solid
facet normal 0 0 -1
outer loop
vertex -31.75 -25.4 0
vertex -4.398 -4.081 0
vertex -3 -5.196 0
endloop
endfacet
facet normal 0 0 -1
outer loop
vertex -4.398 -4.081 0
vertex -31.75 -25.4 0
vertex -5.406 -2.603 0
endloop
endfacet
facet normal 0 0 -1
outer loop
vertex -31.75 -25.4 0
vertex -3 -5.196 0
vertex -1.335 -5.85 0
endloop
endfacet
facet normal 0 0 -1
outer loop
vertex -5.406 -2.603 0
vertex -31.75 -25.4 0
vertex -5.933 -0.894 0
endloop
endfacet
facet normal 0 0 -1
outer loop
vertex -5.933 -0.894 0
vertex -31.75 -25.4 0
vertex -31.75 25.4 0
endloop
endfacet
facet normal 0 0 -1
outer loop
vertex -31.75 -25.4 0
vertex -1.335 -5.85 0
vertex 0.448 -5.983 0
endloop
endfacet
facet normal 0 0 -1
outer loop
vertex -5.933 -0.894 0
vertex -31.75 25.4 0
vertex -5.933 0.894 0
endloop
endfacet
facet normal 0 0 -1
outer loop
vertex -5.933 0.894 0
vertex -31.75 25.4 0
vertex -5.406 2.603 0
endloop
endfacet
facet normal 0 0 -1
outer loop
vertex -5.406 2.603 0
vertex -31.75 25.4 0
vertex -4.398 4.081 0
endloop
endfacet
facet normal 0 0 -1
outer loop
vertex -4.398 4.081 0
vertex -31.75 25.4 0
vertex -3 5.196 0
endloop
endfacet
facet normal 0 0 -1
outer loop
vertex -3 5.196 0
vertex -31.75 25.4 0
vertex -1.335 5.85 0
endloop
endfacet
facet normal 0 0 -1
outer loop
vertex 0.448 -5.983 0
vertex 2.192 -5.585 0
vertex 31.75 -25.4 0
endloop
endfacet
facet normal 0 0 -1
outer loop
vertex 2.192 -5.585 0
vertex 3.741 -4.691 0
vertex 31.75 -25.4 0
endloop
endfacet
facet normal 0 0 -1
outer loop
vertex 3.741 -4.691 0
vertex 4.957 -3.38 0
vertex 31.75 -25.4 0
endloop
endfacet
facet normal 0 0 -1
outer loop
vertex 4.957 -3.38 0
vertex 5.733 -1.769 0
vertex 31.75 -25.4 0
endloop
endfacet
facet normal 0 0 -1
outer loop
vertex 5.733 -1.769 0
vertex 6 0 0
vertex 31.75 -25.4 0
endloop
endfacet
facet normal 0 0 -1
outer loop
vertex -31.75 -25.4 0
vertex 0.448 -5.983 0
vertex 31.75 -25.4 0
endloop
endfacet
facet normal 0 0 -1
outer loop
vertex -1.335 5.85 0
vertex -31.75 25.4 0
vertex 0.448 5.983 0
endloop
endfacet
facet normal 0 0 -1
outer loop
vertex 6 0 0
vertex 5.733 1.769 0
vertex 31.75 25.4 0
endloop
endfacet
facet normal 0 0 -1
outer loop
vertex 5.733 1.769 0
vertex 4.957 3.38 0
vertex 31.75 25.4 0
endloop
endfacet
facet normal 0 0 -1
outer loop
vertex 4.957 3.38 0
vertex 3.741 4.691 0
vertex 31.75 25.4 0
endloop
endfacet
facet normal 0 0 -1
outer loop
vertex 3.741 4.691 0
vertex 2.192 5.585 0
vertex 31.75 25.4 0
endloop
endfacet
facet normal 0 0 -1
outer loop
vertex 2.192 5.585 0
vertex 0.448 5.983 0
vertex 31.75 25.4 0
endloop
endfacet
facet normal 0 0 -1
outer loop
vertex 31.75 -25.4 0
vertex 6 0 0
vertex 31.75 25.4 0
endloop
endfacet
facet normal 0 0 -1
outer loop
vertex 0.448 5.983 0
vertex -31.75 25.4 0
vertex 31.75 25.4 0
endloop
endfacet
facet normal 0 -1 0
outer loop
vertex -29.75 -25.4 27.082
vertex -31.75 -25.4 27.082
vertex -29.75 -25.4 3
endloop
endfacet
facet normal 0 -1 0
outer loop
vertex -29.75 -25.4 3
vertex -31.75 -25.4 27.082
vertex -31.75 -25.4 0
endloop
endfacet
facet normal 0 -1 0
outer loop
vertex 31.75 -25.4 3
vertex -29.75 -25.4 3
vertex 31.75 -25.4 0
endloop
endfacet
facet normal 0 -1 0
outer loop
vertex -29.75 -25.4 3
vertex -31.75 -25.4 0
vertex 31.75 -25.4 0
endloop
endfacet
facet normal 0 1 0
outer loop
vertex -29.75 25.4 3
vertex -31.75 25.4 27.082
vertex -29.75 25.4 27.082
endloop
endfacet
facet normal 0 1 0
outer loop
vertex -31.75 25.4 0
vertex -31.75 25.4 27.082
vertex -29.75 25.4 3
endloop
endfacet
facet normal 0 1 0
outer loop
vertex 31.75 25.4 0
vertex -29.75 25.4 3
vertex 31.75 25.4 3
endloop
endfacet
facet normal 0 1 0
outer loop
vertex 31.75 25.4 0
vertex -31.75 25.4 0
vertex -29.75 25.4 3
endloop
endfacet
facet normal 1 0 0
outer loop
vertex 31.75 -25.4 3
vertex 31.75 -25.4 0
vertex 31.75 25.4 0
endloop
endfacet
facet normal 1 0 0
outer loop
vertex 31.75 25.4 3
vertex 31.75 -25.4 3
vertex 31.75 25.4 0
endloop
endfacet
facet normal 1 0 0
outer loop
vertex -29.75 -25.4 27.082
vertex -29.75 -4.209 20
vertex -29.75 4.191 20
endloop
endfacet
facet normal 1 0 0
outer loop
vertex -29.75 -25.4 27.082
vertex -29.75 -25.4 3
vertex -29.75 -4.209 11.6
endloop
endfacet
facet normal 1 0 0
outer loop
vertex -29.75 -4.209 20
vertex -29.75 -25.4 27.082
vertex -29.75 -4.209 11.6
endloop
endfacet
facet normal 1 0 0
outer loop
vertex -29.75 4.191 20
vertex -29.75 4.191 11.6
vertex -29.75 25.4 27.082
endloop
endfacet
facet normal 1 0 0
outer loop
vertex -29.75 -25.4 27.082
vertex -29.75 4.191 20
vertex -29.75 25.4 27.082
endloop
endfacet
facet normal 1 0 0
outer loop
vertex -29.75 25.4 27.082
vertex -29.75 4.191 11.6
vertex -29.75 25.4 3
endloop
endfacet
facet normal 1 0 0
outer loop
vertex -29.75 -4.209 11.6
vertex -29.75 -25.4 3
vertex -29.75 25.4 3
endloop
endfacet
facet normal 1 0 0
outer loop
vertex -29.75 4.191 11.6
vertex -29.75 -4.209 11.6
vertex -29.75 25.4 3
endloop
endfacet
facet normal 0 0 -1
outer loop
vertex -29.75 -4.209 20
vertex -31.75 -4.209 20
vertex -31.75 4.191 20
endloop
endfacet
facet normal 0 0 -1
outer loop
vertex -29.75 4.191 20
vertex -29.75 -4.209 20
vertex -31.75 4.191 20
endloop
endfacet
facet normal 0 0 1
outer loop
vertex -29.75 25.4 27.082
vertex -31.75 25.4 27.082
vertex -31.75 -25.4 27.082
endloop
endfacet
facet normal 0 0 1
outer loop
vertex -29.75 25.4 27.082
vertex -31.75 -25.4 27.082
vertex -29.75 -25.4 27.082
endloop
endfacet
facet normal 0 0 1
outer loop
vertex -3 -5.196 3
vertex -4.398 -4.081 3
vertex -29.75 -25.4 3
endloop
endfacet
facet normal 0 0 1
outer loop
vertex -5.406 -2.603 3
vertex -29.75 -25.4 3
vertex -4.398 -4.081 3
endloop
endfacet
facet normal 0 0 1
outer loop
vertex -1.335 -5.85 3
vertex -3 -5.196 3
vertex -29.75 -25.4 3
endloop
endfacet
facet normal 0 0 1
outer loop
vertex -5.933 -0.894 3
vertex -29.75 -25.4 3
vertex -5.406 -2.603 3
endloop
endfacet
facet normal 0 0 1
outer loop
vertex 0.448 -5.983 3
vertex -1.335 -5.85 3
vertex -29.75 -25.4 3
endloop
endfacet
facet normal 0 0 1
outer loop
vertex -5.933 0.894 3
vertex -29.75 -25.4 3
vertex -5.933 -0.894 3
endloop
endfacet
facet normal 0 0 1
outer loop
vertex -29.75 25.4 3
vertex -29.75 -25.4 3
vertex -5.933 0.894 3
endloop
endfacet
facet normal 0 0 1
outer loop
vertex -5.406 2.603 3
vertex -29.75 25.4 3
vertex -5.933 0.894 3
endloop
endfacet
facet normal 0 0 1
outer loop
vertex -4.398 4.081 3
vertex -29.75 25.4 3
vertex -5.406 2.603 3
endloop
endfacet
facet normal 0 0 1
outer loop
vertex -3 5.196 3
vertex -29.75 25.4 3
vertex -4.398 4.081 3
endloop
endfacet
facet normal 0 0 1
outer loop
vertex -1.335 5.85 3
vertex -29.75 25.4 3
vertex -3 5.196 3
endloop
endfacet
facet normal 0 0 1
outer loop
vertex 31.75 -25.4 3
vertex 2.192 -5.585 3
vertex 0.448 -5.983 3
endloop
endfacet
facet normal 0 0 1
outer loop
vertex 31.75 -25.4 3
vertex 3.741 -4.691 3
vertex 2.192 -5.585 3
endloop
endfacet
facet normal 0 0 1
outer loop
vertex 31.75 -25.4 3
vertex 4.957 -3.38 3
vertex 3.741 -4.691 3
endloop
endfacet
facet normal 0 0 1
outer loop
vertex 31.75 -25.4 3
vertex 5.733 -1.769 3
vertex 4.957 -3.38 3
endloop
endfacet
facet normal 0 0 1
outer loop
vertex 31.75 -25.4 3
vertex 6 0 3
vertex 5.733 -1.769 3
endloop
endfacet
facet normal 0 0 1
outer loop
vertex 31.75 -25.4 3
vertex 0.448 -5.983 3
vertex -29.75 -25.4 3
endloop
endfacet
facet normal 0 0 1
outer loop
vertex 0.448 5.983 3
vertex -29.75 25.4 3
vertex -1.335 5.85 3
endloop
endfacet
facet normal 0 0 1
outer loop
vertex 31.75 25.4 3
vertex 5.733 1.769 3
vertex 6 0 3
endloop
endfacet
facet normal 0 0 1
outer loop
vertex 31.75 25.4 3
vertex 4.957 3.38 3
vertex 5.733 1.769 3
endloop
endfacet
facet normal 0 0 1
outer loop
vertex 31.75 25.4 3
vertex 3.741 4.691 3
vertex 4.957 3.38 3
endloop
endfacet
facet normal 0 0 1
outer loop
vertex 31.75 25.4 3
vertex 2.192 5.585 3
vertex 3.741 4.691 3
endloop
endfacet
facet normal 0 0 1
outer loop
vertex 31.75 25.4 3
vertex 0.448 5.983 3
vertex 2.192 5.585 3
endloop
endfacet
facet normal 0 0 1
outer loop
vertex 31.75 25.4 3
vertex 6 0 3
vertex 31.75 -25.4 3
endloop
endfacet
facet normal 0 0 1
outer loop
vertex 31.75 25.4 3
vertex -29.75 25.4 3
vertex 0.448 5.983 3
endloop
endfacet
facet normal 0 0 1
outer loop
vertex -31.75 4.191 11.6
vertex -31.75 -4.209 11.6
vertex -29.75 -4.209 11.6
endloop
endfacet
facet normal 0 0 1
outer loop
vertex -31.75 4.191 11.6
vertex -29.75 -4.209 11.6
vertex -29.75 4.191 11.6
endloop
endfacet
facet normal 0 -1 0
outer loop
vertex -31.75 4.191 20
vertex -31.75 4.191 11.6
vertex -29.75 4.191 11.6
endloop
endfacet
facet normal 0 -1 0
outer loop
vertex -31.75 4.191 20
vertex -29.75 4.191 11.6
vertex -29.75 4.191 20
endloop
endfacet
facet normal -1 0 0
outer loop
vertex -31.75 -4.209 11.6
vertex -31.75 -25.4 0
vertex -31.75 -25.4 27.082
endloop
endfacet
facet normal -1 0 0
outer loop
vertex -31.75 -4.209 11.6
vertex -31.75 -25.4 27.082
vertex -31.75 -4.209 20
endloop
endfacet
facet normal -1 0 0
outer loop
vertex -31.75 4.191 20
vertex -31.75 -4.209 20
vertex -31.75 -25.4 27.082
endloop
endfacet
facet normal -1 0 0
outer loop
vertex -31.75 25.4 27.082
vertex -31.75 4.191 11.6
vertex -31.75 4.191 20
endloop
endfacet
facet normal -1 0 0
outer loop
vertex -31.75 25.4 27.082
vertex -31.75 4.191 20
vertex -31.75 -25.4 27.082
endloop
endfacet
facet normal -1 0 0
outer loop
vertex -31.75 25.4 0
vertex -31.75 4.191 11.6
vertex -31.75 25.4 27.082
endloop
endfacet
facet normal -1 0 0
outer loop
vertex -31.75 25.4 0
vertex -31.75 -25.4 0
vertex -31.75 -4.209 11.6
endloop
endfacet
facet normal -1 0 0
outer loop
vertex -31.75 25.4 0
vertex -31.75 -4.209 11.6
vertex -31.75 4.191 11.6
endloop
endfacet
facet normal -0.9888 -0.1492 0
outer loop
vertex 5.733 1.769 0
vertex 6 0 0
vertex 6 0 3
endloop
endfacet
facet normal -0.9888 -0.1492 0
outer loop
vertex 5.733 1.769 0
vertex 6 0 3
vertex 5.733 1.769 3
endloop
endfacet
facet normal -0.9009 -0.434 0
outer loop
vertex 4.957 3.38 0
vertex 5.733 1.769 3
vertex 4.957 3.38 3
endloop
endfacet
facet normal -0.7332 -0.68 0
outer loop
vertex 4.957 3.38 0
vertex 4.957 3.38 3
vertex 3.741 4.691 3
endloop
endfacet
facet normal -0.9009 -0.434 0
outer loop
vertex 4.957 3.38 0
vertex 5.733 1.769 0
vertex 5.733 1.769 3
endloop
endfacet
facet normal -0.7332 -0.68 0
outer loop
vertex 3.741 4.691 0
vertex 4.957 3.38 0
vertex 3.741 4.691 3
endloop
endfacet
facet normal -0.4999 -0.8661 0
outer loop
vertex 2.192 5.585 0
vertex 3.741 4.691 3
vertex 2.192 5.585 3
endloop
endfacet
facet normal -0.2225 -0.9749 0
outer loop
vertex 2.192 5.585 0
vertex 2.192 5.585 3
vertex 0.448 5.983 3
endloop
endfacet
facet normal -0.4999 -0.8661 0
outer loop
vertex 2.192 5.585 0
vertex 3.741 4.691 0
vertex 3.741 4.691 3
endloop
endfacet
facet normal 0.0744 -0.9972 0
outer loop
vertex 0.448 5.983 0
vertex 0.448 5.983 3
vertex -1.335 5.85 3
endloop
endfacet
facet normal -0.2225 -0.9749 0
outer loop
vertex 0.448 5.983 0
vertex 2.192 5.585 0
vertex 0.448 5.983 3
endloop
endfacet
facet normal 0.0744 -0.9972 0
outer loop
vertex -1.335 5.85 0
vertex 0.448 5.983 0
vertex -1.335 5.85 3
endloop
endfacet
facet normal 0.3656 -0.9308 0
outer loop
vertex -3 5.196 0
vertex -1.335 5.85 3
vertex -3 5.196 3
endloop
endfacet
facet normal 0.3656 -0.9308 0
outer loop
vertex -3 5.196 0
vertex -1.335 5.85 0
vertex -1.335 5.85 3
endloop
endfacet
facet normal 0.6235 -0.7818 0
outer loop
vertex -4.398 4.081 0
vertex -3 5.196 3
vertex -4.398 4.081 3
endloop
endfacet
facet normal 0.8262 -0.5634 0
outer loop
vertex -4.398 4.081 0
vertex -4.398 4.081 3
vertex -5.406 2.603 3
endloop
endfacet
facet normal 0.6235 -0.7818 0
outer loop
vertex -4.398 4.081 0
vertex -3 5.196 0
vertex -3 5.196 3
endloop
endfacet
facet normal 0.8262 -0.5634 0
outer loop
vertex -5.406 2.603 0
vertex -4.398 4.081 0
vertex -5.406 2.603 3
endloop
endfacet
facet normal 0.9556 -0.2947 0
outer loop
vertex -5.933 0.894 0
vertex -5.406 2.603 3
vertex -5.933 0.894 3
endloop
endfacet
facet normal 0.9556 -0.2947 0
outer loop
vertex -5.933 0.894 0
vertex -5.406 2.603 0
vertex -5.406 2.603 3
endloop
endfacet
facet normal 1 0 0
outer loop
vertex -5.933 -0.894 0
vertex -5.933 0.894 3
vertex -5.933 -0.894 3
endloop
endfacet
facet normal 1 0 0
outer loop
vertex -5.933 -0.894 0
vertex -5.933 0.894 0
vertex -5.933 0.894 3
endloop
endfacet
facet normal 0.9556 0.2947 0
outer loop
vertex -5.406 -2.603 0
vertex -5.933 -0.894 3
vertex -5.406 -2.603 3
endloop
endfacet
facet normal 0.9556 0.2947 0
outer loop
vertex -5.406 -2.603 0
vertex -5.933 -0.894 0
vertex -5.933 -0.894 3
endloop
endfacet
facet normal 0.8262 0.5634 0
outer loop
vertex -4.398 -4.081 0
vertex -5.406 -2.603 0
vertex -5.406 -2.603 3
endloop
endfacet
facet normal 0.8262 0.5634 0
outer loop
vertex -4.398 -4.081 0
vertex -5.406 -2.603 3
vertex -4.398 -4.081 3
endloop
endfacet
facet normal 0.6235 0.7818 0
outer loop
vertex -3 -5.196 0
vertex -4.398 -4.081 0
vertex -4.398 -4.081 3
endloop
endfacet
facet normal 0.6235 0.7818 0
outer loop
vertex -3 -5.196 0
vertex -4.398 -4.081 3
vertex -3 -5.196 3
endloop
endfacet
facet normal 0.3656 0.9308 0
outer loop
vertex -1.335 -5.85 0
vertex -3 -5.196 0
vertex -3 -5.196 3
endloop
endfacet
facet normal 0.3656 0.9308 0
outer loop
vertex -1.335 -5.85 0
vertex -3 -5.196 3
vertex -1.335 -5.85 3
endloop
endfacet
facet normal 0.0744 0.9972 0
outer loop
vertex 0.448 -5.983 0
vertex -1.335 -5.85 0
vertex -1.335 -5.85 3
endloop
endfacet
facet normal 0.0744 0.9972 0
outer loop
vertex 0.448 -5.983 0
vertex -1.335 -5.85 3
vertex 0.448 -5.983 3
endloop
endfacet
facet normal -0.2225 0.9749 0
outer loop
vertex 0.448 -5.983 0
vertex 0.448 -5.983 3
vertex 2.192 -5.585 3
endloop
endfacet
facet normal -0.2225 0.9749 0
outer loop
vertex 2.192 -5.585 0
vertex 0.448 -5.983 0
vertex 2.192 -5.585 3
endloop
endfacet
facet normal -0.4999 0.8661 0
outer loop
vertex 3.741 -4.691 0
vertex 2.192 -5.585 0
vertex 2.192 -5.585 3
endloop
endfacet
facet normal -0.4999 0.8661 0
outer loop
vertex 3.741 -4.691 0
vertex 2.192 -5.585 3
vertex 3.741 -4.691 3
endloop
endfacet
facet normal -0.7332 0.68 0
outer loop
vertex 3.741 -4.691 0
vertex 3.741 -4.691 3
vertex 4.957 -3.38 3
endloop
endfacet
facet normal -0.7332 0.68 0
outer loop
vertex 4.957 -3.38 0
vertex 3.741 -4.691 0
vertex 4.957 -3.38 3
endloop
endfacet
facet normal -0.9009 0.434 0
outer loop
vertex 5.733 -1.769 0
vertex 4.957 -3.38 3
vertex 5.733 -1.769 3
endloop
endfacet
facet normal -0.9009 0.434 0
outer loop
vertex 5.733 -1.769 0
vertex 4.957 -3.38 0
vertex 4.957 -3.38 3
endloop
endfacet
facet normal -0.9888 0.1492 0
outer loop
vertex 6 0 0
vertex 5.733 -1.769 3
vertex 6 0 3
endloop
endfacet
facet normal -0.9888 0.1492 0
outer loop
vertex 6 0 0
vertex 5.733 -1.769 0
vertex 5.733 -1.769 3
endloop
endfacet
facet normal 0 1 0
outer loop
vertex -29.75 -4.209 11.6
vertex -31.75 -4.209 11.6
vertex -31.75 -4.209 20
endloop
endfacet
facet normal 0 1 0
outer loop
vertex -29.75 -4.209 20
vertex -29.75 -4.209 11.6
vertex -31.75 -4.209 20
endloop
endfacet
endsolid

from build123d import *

# Parameters (mm, degrees)
SKETCH1_W           = 63.5
SKETCH1_H           = 50.8
SKETCH1_R           = 6
BOSS_EXTRUDE1_DEPTH = 3
SKETCH2_W           = 2
SKETCH2_H           = 50.8
BOSS_EXTRUDE2_DEPTH = 24.082
SKETCH3_W           = 8.4
SKETCH3_H           = 8.4
CUT_EXTRUDE1_DEPTH  = 2


with BuildPart() as part:
    # Sketch1 → Boss-Extrude1 (new body)
    with BuildSketch(Plane.XY):
        Rectangle(SKETCH1_W, SKETCH1_H)
        Circle(SKETCH1_R, mode=Mode.SUBTRACT)
    extrude(amount=BOSS_EXTRUDE1_DEPTH)

    # Sketch2 → Boss-Extrude2 (add)
    with BuildSketch(Plane.XY.offset(3)):
        with Locations((-30.75, 0)):
            Rectangle(SKETCH2_W, SKETCH2_H)
    extrude(amount=BOSS_EXTRUDE2_DEPTH)

    # Sketch3 → Cut-Extrude1 (cut)
    with BuildSketch(Plane.ZY.offset(31.75)):
        with Locations((15.8, -0.009)):
            Rectangle(SKETCH3_W, SKETCH3_H)
    extrude(amount=-CUT_EXTRUDE1_DEPTH, mode=Mode.SUBTRACT)


solid = part.part
